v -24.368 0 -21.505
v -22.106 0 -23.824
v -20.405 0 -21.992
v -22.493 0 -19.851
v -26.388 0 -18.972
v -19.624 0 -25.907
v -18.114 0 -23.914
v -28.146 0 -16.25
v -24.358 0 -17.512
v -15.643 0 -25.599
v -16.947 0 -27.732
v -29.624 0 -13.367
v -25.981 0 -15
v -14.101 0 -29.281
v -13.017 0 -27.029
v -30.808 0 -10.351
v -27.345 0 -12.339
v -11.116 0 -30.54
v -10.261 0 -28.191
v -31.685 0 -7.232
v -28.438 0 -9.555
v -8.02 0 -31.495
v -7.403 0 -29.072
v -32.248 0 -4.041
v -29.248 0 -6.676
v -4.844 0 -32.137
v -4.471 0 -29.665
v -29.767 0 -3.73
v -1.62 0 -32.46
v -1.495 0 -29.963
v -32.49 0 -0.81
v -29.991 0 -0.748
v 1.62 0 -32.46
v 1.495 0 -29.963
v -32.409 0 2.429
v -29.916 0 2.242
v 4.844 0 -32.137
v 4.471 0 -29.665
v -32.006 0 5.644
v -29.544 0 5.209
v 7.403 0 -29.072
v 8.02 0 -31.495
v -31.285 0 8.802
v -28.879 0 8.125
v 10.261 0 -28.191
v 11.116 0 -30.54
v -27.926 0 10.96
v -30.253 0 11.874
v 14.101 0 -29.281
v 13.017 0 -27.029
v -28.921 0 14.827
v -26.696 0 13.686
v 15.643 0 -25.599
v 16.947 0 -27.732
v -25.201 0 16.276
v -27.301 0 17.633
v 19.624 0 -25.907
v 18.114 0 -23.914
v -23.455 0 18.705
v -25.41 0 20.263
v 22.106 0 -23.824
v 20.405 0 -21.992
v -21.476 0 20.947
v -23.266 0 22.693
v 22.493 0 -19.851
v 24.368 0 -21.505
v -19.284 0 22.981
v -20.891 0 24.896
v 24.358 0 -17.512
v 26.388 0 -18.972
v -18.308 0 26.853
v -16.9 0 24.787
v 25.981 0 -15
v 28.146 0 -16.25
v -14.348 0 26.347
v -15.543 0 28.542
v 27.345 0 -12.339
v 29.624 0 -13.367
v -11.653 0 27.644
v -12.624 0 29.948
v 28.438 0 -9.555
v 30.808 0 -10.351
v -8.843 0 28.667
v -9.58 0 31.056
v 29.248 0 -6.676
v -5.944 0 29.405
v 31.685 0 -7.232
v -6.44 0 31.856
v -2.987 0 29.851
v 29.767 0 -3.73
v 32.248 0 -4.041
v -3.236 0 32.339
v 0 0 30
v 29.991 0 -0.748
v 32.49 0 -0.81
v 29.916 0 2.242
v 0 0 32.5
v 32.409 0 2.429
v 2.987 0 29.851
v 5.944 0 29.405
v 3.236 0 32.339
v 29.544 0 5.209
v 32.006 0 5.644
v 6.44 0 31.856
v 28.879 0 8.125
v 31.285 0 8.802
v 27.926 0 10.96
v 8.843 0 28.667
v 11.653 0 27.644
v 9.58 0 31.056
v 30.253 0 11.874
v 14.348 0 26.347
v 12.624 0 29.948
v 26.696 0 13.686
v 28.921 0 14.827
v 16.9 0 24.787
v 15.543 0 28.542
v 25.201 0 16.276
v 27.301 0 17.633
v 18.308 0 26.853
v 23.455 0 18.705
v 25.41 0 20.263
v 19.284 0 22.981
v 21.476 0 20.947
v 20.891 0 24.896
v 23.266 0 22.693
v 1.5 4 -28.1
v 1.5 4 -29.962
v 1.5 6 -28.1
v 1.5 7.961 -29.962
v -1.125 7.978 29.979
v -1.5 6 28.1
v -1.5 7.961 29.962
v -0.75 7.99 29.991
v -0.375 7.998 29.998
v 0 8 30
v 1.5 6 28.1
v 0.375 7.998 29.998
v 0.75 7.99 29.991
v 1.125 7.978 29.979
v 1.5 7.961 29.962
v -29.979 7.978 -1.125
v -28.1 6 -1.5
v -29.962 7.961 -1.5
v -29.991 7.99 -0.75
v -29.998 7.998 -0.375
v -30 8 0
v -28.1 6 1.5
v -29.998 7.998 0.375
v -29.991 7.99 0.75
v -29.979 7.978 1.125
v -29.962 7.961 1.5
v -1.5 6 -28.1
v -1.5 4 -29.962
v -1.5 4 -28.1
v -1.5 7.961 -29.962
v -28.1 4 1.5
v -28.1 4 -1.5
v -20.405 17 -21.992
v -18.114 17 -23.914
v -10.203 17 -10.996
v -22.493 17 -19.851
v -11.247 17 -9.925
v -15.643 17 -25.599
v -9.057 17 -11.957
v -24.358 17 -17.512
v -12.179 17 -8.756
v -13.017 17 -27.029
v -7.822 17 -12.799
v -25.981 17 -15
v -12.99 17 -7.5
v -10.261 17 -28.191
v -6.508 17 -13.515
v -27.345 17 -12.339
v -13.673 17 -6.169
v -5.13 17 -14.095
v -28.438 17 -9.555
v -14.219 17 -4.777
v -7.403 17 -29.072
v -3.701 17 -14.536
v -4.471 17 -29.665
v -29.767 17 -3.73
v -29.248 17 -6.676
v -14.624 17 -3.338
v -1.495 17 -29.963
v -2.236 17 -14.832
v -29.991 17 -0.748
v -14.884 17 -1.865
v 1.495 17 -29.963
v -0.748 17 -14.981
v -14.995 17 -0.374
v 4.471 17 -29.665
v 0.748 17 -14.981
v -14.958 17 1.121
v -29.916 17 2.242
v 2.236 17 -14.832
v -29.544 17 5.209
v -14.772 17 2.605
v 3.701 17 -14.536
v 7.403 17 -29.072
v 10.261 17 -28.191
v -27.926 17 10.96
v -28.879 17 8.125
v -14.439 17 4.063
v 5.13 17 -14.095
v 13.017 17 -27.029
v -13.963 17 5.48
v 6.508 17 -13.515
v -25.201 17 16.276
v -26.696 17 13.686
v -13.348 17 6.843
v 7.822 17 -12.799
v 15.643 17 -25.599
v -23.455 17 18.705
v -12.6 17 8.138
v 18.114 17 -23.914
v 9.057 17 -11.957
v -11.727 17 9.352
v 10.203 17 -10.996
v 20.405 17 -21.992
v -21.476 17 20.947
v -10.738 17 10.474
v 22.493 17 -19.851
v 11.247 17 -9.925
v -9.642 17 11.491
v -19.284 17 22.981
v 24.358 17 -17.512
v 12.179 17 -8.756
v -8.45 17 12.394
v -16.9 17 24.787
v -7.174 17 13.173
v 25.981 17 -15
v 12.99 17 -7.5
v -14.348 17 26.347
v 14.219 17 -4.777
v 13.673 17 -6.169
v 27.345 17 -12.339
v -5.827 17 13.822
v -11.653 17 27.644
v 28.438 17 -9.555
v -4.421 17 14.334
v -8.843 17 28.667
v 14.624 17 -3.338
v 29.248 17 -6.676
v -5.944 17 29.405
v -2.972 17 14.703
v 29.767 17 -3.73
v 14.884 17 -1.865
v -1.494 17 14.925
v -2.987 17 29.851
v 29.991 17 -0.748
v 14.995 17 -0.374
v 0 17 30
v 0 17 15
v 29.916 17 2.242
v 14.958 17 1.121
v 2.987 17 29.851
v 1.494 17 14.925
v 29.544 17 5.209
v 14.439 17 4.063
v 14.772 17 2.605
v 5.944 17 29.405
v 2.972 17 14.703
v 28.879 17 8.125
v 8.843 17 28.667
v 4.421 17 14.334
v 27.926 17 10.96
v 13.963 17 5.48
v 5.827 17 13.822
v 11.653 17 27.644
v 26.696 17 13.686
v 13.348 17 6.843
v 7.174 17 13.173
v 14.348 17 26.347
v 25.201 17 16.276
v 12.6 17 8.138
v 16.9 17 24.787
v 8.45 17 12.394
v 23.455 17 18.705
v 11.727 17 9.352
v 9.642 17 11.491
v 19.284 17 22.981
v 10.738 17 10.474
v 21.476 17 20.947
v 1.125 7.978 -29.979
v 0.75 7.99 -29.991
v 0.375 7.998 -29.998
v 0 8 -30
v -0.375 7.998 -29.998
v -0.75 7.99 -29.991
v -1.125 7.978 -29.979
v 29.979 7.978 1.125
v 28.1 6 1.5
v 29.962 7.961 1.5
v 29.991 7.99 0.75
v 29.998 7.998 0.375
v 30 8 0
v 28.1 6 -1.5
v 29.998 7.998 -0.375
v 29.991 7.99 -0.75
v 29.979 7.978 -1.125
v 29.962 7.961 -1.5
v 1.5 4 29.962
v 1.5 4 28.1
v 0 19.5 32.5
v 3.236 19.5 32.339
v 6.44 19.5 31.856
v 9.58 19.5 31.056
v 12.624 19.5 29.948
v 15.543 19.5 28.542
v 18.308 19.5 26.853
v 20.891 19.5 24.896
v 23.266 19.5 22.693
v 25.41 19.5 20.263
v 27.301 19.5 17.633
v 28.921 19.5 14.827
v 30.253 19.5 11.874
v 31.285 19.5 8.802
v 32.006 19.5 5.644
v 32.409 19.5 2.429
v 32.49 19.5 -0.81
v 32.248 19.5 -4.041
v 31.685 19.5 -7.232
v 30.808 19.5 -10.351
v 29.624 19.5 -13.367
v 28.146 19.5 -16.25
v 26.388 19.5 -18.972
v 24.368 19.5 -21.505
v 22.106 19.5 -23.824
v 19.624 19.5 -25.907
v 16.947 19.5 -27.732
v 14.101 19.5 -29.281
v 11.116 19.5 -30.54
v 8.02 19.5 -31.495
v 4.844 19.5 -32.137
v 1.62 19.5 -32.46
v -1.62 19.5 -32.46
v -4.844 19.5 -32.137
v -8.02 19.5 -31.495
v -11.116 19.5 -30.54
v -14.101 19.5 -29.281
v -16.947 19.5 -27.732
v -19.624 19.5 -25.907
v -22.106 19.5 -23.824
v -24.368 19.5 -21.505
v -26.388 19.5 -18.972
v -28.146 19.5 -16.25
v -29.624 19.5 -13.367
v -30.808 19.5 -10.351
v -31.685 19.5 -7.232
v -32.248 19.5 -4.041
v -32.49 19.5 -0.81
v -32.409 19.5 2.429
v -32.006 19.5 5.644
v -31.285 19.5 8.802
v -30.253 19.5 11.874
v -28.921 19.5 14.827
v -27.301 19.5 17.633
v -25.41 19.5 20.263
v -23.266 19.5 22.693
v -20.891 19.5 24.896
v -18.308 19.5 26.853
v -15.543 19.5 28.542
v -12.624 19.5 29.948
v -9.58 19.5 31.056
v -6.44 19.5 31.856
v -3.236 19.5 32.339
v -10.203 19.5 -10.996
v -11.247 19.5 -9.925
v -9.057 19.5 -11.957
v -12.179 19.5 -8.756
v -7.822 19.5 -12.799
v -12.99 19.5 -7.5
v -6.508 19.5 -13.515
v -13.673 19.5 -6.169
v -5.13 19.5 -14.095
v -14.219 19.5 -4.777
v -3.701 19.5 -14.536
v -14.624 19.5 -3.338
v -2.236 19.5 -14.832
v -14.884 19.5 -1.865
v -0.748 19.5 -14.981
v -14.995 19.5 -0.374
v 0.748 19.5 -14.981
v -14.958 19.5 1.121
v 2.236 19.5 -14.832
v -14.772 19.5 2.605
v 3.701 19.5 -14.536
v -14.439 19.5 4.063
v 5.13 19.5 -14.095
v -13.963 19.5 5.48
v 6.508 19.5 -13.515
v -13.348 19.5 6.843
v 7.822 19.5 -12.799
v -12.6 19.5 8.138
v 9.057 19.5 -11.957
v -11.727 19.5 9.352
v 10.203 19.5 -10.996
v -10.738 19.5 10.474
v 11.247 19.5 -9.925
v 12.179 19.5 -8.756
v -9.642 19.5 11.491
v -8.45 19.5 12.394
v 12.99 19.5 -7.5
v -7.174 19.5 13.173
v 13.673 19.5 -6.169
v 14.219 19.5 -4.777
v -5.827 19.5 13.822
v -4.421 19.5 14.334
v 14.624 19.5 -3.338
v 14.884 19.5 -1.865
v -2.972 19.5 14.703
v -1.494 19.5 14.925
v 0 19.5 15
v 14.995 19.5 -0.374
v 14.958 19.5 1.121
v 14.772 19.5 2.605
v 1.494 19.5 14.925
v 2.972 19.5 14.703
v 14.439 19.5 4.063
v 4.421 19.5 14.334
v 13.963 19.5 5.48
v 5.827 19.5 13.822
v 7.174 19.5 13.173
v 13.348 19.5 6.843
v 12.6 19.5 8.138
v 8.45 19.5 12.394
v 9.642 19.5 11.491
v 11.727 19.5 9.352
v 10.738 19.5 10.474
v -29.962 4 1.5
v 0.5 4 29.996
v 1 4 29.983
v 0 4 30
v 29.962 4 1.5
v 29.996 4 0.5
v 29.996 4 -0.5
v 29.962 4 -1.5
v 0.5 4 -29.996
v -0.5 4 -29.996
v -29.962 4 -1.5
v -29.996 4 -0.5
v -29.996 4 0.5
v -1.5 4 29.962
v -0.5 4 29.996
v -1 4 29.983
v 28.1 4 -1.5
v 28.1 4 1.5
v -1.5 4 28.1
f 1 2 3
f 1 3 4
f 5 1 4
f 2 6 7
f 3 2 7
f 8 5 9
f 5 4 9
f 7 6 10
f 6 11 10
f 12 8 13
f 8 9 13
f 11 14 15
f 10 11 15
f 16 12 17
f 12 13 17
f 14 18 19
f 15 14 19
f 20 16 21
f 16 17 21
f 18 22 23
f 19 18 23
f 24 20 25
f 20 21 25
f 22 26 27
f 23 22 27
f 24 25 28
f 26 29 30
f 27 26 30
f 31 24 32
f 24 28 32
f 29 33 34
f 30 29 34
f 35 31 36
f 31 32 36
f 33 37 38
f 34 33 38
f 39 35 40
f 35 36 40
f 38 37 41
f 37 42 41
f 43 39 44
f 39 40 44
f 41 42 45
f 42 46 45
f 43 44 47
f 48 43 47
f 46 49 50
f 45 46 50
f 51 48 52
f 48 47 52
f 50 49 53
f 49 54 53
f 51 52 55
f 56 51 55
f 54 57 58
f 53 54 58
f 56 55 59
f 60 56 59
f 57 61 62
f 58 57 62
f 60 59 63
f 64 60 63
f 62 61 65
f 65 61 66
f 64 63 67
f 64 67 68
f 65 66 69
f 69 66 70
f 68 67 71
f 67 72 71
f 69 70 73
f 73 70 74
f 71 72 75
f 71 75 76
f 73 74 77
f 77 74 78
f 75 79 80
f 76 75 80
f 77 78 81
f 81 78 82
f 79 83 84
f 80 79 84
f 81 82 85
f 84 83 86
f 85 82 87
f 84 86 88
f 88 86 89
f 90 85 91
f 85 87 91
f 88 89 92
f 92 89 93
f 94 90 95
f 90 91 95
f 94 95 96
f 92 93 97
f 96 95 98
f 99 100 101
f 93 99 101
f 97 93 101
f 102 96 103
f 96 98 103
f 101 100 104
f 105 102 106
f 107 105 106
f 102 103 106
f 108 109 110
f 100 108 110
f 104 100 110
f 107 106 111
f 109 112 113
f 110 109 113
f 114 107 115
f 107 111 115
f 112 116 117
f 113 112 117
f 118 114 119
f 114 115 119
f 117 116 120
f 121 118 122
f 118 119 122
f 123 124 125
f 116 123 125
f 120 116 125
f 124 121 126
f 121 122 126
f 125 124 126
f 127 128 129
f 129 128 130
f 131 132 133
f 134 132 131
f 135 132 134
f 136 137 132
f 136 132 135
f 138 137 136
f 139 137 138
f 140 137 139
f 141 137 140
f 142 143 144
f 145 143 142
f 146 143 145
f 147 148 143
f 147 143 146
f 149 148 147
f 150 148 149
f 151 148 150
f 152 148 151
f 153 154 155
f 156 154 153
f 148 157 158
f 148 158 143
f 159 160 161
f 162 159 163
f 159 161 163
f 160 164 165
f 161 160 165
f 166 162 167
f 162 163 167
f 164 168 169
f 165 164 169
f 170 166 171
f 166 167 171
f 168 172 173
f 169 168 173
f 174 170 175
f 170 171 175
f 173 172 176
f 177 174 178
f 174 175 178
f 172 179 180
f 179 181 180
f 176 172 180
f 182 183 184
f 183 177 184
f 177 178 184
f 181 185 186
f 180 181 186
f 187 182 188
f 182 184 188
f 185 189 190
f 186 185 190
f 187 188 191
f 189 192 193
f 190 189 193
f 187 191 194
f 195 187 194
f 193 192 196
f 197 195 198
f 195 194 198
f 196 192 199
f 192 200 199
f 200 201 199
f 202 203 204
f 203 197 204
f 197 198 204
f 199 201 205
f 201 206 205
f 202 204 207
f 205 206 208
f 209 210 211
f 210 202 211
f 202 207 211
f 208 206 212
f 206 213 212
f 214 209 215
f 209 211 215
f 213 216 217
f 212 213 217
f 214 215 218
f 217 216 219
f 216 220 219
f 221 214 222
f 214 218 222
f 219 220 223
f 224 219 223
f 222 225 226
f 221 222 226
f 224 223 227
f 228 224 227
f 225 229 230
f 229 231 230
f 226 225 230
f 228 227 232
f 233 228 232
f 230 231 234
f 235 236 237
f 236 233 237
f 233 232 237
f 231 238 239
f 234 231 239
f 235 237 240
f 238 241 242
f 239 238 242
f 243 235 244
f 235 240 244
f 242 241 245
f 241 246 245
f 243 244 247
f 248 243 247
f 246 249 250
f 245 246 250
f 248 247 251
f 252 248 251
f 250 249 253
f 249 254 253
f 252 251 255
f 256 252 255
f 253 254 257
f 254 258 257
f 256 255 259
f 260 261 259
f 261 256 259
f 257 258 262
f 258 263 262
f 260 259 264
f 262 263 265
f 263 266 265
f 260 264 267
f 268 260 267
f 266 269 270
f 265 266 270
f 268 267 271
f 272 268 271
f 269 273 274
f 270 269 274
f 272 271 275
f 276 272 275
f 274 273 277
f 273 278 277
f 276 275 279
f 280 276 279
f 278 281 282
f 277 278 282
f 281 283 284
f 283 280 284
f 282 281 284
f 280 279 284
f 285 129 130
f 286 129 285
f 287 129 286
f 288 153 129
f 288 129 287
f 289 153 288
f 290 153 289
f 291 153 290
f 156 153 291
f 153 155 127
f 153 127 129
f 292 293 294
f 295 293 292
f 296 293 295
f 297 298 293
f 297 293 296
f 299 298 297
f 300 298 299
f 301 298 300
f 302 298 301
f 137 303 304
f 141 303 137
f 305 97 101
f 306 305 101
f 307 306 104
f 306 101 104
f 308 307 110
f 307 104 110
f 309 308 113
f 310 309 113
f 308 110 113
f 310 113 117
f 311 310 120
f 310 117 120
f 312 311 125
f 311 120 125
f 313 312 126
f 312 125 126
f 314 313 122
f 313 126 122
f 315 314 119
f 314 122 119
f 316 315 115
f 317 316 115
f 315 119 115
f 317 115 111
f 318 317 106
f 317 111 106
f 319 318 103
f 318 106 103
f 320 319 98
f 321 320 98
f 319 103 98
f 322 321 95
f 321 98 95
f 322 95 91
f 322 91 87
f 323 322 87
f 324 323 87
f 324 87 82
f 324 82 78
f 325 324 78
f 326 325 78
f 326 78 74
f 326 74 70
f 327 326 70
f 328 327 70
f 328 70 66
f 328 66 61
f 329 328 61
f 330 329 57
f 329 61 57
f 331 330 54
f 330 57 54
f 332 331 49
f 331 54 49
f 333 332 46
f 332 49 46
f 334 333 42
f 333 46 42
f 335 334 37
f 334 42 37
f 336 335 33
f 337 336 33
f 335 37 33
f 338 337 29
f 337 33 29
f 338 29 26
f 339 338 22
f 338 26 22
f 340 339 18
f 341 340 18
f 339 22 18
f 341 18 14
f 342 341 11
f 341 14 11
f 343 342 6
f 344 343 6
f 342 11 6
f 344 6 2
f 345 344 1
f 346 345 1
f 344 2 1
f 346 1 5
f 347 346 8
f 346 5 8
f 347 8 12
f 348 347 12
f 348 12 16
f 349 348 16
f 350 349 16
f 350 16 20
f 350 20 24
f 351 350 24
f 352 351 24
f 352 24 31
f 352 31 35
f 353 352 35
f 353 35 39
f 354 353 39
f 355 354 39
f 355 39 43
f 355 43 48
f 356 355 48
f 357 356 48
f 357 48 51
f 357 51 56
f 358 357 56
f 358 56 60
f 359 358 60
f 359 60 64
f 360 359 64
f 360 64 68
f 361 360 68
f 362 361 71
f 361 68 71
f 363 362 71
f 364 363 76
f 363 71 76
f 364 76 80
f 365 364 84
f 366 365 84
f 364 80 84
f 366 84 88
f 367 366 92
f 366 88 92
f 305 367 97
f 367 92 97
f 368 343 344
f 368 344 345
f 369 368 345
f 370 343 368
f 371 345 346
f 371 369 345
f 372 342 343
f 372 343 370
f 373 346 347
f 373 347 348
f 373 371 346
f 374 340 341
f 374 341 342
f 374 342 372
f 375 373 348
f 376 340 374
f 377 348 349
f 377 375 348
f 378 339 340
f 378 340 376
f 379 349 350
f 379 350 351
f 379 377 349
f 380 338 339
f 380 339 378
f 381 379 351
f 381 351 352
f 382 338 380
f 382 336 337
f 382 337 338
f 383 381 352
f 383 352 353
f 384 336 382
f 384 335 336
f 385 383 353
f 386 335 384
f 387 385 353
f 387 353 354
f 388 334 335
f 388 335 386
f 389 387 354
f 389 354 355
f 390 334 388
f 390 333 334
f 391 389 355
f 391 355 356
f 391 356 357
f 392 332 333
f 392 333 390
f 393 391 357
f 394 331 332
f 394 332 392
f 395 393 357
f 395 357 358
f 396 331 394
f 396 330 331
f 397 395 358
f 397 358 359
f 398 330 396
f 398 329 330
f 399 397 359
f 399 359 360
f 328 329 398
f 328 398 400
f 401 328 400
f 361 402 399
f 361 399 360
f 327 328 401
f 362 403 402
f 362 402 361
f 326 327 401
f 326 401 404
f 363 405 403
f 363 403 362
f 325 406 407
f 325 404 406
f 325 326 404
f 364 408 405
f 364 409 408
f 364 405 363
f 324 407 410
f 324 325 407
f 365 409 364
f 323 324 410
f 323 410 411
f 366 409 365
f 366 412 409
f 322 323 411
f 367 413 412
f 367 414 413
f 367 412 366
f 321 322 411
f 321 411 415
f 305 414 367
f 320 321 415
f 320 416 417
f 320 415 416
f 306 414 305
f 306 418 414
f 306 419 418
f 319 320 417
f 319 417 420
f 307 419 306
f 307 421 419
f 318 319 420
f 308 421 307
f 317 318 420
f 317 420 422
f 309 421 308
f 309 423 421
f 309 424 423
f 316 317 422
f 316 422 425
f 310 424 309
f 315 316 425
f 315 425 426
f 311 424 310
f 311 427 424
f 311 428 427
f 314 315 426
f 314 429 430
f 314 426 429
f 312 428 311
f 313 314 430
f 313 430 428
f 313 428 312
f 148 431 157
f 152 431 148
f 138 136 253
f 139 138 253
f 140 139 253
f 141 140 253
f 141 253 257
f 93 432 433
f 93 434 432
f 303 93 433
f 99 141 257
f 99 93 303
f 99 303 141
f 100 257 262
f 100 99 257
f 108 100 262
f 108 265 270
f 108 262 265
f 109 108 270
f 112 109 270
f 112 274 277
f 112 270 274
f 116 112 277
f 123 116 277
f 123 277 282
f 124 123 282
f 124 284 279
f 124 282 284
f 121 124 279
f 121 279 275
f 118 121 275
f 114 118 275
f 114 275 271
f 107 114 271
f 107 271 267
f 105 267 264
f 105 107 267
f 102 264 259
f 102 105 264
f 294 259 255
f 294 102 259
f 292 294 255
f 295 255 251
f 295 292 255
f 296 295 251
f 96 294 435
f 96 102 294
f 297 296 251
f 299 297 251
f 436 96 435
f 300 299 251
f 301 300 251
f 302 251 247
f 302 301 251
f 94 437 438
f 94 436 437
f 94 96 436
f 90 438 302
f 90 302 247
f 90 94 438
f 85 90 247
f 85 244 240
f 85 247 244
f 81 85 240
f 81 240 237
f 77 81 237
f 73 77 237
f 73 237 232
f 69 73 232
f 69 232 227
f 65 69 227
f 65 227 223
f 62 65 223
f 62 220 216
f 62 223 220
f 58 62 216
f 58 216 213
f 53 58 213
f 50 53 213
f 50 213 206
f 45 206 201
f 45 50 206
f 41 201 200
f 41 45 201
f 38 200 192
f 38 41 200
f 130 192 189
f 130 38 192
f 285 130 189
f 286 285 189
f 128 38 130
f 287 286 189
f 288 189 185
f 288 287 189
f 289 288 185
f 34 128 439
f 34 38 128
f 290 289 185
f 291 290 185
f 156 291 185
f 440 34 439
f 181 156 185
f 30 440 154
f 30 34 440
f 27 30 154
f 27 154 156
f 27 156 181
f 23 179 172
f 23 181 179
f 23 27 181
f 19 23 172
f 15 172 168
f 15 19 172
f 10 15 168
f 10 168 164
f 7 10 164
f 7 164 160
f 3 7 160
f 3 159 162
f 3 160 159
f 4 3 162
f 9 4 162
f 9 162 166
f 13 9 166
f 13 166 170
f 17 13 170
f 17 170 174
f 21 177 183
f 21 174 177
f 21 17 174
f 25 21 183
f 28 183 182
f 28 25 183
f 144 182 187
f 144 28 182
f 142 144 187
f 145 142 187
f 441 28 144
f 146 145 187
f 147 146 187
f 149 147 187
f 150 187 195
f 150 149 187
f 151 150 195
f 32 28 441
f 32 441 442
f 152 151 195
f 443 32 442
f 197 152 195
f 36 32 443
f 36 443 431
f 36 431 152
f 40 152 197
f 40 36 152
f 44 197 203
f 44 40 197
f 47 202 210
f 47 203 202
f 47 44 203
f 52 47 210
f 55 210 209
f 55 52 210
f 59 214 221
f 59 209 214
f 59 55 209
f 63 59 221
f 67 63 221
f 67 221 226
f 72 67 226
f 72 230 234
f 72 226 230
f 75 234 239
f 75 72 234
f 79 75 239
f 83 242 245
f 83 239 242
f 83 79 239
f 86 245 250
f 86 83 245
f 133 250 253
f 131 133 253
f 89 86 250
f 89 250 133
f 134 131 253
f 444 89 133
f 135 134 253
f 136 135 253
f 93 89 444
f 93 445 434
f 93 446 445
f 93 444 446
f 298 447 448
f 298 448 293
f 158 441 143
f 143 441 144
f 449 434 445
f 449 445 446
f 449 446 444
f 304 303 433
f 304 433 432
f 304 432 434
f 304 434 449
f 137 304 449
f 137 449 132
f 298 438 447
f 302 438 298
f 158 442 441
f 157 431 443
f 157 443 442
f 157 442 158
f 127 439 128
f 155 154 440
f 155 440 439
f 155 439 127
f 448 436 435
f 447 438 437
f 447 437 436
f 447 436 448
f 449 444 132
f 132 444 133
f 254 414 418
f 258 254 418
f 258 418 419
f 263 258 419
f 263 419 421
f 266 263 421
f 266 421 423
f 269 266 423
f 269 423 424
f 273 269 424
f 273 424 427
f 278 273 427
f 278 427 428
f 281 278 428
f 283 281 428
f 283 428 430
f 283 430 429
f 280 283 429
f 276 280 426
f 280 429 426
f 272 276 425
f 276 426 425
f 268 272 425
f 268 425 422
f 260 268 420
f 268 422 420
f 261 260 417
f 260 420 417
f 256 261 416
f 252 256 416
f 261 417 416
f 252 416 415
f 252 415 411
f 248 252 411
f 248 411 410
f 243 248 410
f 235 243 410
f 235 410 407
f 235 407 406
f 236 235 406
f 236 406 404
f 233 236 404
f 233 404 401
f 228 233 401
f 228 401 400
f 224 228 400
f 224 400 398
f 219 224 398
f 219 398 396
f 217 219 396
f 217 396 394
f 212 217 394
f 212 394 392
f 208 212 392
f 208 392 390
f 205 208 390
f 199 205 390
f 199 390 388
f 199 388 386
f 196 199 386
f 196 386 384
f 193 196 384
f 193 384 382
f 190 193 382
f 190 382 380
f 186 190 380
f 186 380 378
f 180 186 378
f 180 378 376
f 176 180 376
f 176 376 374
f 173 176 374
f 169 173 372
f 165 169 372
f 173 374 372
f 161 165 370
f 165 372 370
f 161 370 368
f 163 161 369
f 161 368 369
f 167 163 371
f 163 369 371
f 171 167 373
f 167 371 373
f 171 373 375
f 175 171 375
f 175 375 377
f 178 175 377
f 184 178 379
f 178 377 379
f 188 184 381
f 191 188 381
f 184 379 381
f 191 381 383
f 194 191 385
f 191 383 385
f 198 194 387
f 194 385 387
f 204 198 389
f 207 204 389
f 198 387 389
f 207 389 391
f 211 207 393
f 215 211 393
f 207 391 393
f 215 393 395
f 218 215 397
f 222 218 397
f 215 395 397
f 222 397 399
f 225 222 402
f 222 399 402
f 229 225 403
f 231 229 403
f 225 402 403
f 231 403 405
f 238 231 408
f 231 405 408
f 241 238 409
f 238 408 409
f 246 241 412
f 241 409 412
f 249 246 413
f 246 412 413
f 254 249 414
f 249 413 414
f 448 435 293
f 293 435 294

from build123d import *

# Parameters (mm, degrees)
CROQUIS1_R              = 32.5
SALIENTE_EXTRUIR1_DEPTH = 19.5
VACIADO1_T              = -2.5
CROQUIS2_R              = 15
CORTAR_EXTRUIR1_DEPTH   = 19.5
SALIENTE_EXTRUIR2_DEPTH = 1.5
MATRIZC2_COUNT          = 4


with BuildPart() as part:
    # Croquis1 → Saliente-Extruir1 (new body)
    with BuildSketch(Plane(origin=(0, 0, 0), x_dir=(1, 0, 0), z_dir=(0, 1, 0))):
        with Locations(Location((0, 0, 0), (0, 0, 270))):
            Circle(CROQUIS1_R)
    extrude(amount=SALIENTE_EXTRUIR1_DEPTH)

    # Vaciado1
    vaciado1_openings = [part.faces().sort_by_distance(p)[0] for p in [
        (0, 0, 0),
    ]]
    offset(amount=VACIADO1_T, openings=vaciado1_openings, kind=Kind.INTERSECTION)

    # Croquis2 → Cortar-Extruir1 (cut)
    with BuildSketch(Plane(origin=(0, 19.5, 0), x_dir=(1, 0, 0), z_dir=(0, 1, 0))):
        with Locations(Location((0, 0, 0), (0, 0, 270))):
            Circle(CROQUIS2_R)
    extrude(amount=-CORTAR_EXTRUIR1_DEPTH, mode=Mode.SUBTRACT)

    # Croquis3 → Saliente-Extruir2 (add, symmetric)
    with BuildSketch(Plane(origin=(0, 0, 0), x_dir=(0, 0, -1), z_dir=(1, 0, 0))):
        Polygon((-30, 4), (-28.1, 4), (-28.1, 6), (-30, 8), align=None)
    saliente_extruir2 = extrude(amount=SALIENTE_EXTRUIR2_DEPTH, both=True)

    # MatrizC2: Saliente-Extruir2 ×4 about axis
    matrizc2_axis = Axis((0, 0, 0), (0, 1, 0))
    for i in range(1, MATRIZC2_COUNT):
        add(saliente_extruir2.rotate(matrizc2_axis, i * 360 / MATRIZC2_COUNT))


solid = part.part
